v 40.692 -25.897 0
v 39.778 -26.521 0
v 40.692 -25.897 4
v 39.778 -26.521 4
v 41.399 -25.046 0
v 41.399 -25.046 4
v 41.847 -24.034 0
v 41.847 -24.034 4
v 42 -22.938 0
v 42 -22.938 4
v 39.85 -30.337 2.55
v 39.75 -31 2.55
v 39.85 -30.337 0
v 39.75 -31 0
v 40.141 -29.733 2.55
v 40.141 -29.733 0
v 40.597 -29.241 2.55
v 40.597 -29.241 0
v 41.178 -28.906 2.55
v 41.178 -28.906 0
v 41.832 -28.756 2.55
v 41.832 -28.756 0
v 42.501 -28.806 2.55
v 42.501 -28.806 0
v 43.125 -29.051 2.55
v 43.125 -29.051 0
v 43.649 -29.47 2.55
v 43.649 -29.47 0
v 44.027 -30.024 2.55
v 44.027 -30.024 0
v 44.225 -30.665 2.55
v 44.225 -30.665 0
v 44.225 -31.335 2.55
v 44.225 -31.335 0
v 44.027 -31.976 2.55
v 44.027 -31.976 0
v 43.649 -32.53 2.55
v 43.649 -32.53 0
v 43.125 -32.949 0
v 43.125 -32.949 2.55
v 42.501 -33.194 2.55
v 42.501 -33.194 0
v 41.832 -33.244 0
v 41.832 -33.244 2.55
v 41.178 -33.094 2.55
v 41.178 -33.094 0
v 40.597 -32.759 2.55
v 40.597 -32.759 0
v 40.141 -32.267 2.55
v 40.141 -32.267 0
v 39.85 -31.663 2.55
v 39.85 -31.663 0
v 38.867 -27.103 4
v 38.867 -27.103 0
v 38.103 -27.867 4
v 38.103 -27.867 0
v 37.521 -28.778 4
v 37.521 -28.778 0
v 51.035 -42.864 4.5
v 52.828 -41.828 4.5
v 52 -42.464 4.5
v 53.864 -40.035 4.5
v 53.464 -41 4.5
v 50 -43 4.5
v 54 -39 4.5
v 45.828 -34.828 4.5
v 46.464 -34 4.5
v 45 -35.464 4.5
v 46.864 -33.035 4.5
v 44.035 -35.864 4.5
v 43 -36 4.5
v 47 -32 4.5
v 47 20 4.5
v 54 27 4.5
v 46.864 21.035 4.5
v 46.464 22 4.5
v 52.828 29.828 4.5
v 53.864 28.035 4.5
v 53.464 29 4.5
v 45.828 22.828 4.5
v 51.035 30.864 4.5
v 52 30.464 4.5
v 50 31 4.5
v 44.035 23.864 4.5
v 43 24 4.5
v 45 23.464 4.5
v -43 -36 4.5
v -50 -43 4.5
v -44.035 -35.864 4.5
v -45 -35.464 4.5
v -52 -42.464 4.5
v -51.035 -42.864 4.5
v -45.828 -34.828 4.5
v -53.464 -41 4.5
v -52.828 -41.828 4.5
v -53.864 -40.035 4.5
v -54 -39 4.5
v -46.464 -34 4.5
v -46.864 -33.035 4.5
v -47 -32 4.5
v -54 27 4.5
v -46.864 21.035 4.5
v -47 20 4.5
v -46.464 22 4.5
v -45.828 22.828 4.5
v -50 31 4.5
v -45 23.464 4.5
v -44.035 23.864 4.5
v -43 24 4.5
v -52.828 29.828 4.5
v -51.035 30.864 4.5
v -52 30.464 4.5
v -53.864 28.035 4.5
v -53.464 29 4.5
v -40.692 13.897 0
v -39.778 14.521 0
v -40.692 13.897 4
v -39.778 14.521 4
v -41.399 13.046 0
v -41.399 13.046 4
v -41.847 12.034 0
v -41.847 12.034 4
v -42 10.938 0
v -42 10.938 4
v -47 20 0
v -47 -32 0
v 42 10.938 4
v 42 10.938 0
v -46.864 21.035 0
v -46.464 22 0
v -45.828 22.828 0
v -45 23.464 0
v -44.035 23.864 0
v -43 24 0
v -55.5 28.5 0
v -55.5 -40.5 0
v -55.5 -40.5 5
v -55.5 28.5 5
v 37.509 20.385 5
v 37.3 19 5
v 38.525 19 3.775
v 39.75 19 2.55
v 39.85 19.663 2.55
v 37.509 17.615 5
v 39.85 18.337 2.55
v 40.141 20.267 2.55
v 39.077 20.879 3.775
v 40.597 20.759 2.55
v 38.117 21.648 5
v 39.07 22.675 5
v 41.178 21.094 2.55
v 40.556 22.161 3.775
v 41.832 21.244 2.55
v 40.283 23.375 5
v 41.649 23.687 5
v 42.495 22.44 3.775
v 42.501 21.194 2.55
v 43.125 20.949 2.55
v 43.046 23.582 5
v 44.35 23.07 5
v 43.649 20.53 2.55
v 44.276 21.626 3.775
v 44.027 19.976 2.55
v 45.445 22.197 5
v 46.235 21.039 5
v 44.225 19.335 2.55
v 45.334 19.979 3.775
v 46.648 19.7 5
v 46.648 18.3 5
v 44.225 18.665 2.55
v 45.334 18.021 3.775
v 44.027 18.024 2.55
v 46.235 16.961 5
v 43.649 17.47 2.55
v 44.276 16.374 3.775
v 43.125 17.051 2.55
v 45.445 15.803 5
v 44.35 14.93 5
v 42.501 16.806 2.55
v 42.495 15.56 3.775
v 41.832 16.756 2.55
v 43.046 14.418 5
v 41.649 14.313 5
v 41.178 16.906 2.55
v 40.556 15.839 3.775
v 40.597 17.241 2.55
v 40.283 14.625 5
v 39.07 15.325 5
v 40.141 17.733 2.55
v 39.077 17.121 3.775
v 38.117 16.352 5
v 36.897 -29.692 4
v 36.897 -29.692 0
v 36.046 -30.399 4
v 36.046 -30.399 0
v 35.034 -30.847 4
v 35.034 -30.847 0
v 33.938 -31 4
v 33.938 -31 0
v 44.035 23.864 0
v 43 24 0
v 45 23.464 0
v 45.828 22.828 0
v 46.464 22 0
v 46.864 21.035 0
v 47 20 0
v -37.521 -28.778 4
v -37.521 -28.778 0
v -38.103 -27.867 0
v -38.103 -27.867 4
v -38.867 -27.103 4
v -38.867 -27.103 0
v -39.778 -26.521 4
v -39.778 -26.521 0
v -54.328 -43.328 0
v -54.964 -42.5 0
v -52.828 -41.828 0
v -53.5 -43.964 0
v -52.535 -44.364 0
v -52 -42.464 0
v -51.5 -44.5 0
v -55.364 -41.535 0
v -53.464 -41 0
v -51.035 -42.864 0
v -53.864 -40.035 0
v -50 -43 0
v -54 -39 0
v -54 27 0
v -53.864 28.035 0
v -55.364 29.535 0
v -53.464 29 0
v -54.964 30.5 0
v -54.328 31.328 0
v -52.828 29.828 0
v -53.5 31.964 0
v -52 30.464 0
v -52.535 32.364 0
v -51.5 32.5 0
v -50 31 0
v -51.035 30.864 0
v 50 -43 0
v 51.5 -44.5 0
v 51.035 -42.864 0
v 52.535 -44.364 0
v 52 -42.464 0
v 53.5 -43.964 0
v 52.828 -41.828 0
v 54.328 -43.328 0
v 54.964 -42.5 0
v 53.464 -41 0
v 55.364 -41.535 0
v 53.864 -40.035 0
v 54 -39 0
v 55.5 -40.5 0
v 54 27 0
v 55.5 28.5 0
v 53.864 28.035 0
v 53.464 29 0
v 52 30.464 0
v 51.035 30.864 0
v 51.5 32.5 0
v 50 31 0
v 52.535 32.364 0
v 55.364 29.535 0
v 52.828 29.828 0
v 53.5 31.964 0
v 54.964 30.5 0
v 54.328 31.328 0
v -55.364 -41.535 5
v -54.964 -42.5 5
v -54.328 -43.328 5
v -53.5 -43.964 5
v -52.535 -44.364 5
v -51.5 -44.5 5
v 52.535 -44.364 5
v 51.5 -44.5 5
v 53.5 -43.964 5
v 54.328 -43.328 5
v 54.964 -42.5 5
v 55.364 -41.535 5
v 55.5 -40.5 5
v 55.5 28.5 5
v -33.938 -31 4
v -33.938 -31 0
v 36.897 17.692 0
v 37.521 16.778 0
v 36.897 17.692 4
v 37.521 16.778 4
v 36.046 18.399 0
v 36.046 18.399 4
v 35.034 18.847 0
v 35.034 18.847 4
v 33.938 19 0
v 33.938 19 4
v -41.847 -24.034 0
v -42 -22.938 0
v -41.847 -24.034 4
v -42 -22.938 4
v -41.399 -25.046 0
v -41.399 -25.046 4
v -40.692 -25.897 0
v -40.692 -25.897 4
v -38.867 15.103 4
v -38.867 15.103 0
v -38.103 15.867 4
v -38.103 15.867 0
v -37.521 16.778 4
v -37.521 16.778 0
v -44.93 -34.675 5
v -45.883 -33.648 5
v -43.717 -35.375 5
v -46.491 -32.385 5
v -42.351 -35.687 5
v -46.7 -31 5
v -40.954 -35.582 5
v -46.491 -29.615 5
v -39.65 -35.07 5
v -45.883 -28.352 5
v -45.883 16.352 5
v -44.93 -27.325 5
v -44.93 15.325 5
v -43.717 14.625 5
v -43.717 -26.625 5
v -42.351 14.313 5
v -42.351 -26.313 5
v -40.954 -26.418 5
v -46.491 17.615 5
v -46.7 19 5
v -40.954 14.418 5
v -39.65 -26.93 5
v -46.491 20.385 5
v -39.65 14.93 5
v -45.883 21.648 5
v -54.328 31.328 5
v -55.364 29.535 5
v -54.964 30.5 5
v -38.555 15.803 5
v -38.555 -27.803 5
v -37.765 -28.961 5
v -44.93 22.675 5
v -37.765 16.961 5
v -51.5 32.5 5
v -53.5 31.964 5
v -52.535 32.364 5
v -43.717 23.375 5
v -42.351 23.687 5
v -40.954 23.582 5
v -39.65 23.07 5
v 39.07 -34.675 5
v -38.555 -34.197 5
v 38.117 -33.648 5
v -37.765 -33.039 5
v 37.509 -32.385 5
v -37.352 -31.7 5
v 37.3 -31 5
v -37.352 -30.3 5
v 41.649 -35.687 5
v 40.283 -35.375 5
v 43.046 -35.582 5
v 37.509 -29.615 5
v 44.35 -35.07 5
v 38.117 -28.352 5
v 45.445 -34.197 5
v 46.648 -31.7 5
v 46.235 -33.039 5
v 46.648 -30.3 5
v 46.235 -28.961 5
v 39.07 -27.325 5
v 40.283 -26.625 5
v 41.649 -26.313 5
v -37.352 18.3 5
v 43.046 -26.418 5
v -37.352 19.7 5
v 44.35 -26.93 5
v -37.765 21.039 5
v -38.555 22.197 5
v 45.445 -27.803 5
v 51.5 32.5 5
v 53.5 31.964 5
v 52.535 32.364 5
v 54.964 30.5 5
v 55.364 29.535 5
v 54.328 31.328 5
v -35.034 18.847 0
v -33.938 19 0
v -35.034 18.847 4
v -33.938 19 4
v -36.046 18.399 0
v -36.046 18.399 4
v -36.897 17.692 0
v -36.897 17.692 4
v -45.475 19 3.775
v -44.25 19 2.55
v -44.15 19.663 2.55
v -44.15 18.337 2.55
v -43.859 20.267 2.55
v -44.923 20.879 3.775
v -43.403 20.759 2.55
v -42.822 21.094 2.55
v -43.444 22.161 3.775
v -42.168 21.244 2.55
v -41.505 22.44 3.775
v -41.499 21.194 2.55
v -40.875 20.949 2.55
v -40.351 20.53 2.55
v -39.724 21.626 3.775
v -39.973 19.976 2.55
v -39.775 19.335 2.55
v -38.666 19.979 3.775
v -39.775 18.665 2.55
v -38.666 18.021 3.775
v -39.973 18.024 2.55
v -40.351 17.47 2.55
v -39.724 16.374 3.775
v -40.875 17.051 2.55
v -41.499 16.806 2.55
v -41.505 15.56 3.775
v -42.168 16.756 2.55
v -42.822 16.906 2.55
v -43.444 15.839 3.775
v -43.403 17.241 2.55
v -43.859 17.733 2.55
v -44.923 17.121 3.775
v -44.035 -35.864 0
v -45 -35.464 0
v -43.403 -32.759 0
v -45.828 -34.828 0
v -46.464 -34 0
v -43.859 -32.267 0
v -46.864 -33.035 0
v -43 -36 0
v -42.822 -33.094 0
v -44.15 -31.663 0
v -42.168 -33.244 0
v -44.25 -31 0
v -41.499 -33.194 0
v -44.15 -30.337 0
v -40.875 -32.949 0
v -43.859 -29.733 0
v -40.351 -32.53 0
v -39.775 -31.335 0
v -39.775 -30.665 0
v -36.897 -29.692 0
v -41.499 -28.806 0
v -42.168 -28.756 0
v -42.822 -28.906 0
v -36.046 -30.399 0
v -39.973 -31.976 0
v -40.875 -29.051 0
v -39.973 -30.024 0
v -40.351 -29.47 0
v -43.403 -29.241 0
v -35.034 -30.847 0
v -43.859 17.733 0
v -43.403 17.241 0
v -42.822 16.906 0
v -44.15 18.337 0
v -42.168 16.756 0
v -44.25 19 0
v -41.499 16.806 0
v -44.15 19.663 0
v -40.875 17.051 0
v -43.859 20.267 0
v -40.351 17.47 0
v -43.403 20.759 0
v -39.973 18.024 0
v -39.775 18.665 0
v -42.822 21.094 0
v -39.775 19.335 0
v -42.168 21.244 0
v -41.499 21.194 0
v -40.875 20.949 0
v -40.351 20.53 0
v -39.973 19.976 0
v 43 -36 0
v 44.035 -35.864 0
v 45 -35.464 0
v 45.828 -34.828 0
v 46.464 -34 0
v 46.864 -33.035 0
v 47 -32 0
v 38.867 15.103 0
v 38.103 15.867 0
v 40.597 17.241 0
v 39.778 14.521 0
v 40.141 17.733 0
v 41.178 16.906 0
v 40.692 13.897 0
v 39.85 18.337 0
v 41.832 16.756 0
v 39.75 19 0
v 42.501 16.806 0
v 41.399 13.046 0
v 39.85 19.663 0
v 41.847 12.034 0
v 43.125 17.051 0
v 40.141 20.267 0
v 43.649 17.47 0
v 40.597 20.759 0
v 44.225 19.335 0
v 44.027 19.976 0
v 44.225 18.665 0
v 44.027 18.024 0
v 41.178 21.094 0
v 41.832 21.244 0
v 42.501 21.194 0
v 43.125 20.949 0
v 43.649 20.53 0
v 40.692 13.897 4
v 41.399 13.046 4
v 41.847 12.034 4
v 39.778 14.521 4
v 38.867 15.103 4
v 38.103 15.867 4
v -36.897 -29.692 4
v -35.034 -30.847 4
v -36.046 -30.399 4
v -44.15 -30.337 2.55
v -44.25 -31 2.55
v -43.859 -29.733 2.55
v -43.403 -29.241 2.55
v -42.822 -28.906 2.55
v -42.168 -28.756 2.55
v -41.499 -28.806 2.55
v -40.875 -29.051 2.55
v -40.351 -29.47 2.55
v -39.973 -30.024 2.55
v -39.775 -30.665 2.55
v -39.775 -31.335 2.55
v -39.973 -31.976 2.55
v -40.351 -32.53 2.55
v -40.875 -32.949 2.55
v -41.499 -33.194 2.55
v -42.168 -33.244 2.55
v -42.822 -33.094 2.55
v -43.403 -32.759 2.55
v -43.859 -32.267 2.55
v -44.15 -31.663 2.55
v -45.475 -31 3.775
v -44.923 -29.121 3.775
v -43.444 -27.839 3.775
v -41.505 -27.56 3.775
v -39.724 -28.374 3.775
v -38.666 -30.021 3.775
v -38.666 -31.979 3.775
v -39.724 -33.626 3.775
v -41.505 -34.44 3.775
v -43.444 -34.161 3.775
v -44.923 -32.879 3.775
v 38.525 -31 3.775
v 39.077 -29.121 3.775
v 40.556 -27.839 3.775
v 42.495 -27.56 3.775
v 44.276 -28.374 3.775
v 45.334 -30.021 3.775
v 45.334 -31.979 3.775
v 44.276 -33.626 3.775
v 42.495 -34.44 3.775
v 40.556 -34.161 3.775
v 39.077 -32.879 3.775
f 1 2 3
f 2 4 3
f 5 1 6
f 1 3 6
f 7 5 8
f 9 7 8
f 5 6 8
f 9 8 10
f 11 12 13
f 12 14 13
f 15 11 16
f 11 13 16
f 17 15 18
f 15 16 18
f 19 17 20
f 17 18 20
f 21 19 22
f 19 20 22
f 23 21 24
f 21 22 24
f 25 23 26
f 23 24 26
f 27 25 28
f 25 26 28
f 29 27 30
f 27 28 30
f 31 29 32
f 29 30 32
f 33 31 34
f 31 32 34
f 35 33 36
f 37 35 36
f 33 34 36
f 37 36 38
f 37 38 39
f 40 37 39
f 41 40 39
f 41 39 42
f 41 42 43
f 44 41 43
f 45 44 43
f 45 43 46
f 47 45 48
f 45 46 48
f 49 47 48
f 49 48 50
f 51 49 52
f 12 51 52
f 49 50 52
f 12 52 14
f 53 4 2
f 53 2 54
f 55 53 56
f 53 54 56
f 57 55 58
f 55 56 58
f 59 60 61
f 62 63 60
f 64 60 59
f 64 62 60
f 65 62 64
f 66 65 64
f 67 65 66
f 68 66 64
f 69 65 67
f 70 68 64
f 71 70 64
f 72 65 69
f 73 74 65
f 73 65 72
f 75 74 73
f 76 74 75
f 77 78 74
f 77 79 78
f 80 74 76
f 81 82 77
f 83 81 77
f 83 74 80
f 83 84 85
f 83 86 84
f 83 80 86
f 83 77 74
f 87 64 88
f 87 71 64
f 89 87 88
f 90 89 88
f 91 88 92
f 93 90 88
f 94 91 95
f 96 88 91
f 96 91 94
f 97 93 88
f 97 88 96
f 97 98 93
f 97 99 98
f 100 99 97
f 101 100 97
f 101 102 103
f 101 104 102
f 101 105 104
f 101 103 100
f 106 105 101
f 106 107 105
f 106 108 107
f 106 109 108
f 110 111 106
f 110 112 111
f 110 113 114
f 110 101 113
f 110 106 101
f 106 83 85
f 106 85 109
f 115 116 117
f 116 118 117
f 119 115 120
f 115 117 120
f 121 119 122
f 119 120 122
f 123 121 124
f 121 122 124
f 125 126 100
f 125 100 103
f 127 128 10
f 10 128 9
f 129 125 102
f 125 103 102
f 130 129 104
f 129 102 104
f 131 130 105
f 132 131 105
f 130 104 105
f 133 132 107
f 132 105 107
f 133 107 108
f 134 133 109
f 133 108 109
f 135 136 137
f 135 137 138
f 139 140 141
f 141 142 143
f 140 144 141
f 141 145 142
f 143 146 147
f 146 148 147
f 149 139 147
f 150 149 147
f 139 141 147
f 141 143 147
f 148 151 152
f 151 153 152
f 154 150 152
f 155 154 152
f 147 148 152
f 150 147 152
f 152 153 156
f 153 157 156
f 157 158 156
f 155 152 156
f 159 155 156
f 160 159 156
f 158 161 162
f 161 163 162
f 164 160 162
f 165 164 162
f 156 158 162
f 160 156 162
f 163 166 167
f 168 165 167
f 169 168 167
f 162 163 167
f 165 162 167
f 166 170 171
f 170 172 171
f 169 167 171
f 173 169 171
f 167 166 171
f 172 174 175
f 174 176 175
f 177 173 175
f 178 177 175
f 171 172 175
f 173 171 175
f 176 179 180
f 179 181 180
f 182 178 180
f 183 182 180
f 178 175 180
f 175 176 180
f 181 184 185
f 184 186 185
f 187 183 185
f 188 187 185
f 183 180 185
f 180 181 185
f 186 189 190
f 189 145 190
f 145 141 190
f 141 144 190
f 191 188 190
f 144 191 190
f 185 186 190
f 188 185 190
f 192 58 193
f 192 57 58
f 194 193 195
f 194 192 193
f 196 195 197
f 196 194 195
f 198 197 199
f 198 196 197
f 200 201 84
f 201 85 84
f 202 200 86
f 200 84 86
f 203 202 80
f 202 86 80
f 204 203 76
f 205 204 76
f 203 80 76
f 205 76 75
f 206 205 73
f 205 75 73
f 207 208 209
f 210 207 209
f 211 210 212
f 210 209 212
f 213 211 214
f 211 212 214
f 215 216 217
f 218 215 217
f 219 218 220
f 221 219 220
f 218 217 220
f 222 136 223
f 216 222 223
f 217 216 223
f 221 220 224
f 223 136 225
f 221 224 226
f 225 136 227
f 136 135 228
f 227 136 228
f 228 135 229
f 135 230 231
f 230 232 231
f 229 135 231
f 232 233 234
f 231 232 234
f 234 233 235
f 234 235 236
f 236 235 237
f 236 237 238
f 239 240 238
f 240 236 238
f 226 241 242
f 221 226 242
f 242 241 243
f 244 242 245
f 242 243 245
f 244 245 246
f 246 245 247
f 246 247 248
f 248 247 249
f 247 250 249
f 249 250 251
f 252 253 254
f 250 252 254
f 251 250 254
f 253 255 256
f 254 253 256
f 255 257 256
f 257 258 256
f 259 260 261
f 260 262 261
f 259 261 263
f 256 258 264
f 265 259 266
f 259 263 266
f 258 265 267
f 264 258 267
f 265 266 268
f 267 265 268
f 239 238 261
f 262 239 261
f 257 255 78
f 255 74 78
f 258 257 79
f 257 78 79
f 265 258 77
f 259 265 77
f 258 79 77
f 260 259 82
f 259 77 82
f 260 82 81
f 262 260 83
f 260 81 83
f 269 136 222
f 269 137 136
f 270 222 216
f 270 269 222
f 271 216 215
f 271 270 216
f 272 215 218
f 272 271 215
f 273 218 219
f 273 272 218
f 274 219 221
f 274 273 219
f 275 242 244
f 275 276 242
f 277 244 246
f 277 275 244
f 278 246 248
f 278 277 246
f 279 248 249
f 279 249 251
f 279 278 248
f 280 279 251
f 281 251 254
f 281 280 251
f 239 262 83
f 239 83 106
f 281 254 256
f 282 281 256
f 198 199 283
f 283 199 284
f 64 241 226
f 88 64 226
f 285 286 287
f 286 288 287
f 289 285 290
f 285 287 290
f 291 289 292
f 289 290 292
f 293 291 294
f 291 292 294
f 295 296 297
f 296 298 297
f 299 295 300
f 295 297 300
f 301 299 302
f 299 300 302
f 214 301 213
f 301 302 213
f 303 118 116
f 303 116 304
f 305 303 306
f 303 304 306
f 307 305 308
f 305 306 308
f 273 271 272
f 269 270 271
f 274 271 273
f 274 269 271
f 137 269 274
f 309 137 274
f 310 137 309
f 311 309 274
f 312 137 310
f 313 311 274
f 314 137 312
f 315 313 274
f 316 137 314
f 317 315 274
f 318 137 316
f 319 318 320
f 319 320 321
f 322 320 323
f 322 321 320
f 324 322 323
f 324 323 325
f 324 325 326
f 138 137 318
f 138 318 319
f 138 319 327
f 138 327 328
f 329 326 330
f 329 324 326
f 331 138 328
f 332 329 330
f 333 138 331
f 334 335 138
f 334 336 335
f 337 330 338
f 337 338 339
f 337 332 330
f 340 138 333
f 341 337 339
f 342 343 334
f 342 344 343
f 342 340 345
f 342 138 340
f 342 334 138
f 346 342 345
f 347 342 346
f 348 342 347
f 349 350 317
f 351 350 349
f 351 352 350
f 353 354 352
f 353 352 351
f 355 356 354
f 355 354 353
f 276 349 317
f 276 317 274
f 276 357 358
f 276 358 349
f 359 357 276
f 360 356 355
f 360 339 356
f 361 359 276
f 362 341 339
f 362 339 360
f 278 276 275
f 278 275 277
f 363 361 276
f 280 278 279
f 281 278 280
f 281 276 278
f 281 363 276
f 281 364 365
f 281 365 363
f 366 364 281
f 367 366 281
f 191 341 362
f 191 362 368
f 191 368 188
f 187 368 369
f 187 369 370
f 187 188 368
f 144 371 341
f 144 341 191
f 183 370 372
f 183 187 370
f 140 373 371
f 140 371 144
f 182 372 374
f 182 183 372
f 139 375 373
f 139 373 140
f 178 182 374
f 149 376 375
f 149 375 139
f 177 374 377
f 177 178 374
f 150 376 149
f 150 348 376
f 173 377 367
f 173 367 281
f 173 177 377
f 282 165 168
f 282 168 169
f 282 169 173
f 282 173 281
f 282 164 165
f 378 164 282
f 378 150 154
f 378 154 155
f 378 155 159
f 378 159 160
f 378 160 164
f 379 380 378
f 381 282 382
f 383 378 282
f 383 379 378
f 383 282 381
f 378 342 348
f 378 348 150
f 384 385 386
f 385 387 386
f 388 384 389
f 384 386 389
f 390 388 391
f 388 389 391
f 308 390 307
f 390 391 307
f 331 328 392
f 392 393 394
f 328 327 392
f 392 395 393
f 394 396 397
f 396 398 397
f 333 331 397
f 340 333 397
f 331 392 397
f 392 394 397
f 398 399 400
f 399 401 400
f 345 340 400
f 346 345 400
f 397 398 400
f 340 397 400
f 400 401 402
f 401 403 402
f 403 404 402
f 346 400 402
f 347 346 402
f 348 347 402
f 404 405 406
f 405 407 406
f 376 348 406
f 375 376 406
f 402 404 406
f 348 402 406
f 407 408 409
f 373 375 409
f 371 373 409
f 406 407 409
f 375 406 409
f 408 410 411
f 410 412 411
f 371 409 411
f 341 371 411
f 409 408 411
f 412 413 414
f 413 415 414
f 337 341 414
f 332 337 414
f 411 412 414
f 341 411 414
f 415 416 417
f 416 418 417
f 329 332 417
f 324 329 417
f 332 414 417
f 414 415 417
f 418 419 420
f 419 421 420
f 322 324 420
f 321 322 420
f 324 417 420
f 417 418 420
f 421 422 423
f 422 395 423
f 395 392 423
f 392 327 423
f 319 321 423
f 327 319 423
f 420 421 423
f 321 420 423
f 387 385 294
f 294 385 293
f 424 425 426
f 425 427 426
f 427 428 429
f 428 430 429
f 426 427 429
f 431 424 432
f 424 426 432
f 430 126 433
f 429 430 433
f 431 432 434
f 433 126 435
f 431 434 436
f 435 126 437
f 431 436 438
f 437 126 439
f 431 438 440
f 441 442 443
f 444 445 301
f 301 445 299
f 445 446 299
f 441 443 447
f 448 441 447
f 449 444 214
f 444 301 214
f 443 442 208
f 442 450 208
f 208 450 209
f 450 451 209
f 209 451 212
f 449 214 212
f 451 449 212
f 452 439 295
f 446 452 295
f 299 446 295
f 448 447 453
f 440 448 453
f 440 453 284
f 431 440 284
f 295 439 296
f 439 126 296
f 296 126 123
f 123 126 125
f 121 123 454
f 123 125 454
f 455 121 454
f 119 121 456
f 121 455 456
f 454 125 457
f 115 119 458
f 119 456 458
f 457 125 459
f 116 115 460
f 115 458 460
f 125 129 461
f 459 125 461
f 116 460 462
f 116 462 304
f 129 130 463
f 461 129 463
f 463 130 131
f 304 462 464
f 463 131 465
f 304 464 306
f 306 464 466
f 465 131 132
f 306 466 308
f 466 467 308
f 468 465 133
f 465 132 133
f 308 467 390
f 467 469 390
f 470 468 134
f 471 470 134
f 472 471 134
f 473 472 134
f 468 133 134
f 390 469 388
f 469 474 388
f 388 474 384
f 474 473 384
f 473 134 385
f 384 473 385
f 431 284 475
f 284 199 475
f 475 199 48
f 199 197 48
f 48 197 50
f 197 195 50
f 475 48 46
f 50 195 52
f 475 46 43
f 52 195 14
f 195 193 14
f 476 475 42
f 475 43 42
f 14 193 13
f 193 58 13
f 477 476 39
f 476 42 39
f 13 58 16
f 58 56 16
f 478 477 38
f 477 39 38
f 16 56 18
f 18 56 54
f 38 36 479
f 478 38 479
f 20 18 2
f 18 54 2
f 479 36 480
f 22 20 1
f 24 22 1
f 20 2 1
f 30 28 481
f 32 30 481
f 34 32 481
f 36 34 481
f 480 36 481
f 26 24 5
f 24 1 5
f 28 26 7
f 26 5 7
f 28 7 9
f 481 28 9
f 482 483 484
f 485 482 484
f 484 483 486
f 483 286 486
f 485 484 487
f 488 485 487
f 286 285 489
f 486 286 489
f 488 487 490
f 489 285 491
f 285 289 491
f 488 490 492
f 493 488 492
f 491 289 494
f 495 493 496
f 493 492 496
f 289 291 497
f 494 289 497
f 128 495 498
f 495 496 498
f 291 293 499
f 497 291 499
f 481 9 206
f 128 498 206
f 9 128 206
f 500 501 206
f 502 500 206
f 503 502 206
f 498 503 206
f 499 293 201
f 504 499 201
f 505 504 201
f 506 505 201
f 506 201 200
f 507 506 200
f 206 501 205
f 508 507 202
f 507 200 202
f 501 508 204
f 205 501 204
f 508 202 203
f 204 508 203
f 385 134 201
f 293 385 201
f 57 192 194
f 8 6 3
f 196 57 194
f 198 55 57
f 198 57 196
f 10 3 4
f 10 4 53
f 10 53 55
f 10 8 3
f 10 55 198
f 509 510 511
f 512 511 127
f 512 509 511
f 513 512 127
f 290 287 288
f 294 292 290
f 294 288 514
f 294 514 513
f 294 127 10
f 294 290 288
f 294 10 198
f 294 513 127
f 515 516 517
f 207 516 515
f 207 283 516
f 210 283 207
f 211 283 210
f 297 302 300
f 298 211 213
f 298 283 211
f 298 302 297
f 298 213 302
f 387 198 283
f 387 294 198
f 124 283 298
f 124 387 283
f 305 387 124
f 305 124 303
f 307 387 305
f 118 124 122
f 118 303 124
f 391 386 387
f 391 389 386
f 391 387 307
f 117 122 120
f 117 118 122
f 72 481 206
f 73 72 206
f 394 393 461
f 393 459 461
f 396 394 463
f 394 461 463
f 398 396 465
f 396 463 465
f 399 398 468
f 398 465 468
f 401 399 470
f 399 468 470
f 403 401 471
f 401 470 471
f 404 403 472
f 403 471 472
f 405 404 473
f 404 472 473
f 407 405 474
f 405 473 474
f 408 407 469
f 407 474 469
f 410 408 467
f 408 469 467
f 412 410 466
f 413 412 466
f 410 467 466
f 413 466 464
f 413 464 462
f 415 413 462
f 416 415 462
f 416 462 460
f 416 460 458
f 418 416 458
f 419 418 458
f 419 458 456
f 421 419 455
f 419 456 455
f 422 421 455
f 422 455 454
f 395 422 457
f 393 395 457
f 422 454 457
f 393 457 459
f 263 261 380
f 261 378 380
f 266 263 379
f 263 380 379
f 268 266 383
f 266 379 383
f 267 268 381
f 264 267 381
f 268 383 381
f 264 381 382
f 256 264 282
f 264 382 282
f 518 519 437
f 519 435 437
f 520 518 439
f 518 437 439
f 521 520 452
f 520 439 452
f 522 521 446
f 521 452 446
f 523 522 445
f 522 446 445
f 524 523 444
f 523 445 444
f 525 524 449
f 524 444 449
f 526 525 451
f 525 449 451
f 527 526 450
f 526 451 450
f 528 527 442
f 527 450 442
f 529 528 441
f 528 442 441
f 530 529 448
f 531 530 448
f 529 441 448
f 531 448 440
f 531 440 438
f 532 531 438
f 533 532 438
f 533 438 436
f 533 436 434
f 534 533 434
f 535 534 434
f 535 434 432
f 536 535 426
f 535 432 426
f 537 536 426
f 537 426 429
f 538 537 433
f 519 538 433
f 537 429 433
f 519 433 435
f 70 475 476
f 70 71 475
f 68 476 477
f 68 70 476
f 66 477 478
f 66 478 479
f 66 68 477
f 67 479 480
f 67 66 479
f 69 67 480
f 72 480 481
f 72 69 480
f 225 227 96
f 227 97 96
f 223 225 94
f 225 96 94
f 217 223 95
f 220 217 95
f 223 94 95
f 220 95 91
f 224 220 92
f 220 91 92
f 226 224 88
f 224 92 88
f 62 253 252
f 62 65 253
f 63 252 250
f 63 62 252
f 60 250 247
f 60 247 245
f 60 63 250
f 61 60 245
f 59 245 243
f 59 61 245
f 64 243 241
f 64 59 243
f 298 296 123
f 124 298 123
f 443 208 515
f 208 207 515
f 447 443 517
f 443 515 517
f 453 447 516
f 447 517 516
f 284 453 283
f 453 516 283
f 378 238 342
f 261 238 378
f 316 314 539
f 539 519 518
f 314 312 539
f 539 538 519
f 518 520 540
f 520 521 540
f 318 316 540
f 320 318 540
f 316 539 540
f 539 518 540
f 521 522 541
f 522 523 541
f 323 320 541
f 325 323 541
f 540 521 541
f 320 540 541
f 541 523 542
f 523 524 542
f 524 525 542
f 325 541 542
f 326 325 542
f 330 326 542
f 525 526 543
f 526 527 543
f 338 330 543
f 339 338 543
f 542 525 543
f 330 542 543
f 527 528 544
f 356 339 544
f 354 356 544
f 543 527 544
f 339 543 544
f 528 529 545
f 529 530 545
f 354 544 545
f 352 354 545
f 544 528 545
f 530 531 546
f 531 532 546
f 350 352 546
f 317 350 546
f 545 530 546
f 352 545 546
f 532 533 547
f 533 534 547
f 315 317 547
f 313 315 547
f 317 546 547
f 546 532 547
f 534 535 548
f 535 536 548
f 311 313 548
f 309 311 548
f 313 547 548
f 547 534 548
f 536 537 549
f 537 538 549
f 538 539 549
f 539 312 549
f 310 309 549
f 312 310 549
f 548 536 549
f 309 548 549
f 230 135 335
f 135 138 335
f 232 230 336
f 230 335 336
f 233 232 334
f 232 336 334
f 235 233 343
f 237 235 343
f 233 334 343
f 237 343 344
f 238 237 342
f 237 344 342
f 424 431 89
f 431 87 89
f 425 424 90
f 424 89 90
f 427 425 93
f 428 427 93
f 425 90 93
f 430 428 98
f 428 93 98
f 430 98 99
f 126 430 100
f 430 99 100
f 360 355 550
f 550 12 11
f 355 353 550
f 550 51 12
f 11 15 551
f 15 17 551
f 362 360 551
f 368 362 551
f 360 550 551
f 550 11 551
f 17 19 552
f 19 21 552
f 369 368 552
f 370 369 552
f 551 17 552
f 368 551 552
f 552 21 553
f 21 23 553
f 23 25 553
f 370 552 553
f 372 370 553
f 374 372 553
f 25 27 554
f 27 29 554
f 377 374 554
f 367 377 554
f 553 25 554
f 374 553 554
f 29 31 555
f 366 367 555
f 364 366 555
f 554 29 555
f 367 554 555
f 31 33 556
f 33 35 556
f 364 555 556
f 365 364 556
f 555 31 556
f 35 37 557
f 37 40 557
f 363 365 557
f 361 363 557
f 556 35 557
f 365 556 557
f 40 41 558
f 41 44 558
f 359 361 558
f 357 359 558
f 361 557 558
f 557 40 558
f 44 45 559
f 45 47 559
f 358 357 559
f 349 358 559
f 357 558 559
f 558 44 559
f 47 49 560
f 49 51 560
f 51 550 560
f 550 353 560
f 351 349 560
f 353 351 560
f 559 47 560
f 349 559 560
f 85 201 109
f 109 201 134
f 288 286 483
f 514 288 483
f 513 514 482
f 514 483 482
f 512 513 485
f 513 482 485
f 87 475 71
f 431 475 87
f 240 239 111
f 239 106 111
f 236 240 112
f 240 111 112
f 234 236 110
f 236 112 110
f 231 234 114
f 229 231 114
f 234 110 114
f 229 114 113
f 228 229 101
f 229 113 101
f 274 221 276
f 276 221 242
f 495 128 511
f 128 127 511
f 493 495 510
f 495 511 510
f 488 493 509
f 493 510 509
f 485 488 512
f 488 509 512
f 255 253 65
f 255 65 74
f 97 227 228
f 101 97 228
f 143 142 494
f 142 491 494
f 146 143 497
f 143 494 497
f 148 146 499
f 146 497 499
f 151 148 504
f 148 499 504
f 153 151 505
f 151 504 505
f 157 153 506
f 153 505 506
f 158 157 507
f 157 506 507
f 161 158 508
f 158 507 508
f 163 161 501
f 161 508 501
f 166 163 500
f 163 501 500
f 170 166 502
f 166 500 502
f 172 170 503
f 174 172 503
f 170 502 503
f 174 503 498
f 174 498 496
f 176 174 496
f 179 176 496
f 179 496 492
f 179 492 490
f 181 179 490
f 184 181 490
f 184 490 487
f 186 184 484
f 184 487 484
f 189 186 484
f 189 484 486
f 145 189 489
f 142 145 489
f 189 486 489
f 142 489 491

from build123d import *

# Parameters (mm, degrees)
SKETCH_1_W                   = 111
SKETCH_1_H                   = 77
SKETCH_1_R                   = 2
EXTRUDE_1_DEPTH              = 5
SKETCH_2_W                   = 108
SKETCH_2_H                   = 74
SKETCH_2_W_2                 = 94
SKETCH_2_H_2                 = 60
CUT_EXTRUDE_1_DEPTH          = 4.5
CUT_EXTRUDE_2_DEPTH          = 4
FILLET_1_R                   = 4
HOLE_WIZARD_M4_1_D           = 4.5
HOLE_WIZARD_M4_1_CSINK_D     = 9.4
HOLE_WIZARD_M4_1_CSINK_ANGLE = 90


with BuildPart() as part:
    # ｽｹｯﾁ1 → ﾎﾞｽ - 押し出し1 (new body)
    with BuildSketch(Plane.XY):
        with Locations((0, -6)):
            Rectangle(SKETCH_1_W, SKETCH_1_H)
        with Locations((-42, 19)):
            Circle(SKETCH_1_R, mode=Mode.SUBTRACT)
        with Locations(Location((42, 19, 0), (0, 0, 180))):
            Circle(SKETCH_1_R, mode=Mode.SUBTRACT)
        with Locations((42, -31)):
            Circle(SKETCH_1_R, mode=Mode.SUBTRACT)
        with Locations(Location((-42, -31, 0), (0, 0, 180))):
            Circle(SKETCH_1_R, mode=Mode.SUBTRACT)
    extrude(amount=EXTRUDE_1_DEPTH)

    # ｽｹｯﾁ2 → ｶｯﾄ - 押し出し1 (cut)
    with BuildSketch(Plane(origin=(0, 0, 0), x_dir=(-1, 0, 0), z_dir=(0, 0, -1))):
        with Locations((0, -6)):
            Rectangle(SKETCH_2_W, SKETCH_2_H)
        with Locations((0, -6)):
            Rectangle(SKETCH_2_W_2, SKETCH_2_H_2, mode=Mode.SUBTRACT)
    extrude(amount=-CUT_EXTRUDE_1_DEPTH, mode=Mode.SUBTRACT)

    # ｽｹｯﾁ3 → ｶｯﾄ - 押し出し2 (cut)
    with BuildSketch(Plane(origin=(0, 0, 0), x_dir=(-1, 0, 0), z_dir=(0, 0, -1))):
        with BuildLine():
            Line((-37, -31), (37, -31))
            ThreePointArc((37, -31), (38.464466094, -27.464466094), (42, -26))
            Line((42, -26), (42, 14))
            ThreePointArc((42, 14), (38.464466094, 15.464466094), (37, 19))
            Line((37, 19), (-37, 19))
            ThreePointArc((-37, 19), (-38.464466094, 15.464466094), (-42, 14))
            Line((-42, 14), (-42, -26))
            ThreePointArc((-42, -26), (-38.464466094, -27.464466094), (-37, -31))
        make_face()
    extrude(amount=-CUT_EXTRUDE_2_DEPTH, mode=Mode.SUBTRACT)

    # ﾌｨﾚｯﾄ1
    fillet_1_edges = [part.edges().sort_by_distance(p)[0] for p in [
        (-54, -43, 2.25),
        (54, -43, 2.25),
        (54, 31, 2.25),
        (-54, 31, 2.25),
        (47, -36, 2.25),
        (47, 24, 2.25),
        (-47, 24, 2.25),
        (-47, -36, 2.25),
        (-37, 19, 2),
        (-42, 14, 2),
        (-42, -26, 2),
        (-37, -31, 2),
        (37, -31, 2),
        (42, -26, 2),
        (42, 14, 2),
        (37, 19, 2),
        (-55.5, -44.5, 2.5),
        (-55.5, 32.5, 2.5),
        (55.5, 32.5, 2.5),
        (55.5, -44.5, 2.5),
    ]]
    fillet(fillet_1_edges, radius=FILLET_1_R)

    # M4 丸皿ねじ用皿穴1 (through all)
    with Locations(Plane.XY.offset(5)):
        with Locations((-42, 19), (-42, -31), (42, -31), (42, 19)):
            CounterSinkHole(HOLE_WIZARD_M4_1_D / 2, HOLE_WIZARD_M4_1_CSINK_D / 2, counter_sink_angle=HOLE_WIZARD_M4_1_CSINK_ANGLE)


solid = part.part
